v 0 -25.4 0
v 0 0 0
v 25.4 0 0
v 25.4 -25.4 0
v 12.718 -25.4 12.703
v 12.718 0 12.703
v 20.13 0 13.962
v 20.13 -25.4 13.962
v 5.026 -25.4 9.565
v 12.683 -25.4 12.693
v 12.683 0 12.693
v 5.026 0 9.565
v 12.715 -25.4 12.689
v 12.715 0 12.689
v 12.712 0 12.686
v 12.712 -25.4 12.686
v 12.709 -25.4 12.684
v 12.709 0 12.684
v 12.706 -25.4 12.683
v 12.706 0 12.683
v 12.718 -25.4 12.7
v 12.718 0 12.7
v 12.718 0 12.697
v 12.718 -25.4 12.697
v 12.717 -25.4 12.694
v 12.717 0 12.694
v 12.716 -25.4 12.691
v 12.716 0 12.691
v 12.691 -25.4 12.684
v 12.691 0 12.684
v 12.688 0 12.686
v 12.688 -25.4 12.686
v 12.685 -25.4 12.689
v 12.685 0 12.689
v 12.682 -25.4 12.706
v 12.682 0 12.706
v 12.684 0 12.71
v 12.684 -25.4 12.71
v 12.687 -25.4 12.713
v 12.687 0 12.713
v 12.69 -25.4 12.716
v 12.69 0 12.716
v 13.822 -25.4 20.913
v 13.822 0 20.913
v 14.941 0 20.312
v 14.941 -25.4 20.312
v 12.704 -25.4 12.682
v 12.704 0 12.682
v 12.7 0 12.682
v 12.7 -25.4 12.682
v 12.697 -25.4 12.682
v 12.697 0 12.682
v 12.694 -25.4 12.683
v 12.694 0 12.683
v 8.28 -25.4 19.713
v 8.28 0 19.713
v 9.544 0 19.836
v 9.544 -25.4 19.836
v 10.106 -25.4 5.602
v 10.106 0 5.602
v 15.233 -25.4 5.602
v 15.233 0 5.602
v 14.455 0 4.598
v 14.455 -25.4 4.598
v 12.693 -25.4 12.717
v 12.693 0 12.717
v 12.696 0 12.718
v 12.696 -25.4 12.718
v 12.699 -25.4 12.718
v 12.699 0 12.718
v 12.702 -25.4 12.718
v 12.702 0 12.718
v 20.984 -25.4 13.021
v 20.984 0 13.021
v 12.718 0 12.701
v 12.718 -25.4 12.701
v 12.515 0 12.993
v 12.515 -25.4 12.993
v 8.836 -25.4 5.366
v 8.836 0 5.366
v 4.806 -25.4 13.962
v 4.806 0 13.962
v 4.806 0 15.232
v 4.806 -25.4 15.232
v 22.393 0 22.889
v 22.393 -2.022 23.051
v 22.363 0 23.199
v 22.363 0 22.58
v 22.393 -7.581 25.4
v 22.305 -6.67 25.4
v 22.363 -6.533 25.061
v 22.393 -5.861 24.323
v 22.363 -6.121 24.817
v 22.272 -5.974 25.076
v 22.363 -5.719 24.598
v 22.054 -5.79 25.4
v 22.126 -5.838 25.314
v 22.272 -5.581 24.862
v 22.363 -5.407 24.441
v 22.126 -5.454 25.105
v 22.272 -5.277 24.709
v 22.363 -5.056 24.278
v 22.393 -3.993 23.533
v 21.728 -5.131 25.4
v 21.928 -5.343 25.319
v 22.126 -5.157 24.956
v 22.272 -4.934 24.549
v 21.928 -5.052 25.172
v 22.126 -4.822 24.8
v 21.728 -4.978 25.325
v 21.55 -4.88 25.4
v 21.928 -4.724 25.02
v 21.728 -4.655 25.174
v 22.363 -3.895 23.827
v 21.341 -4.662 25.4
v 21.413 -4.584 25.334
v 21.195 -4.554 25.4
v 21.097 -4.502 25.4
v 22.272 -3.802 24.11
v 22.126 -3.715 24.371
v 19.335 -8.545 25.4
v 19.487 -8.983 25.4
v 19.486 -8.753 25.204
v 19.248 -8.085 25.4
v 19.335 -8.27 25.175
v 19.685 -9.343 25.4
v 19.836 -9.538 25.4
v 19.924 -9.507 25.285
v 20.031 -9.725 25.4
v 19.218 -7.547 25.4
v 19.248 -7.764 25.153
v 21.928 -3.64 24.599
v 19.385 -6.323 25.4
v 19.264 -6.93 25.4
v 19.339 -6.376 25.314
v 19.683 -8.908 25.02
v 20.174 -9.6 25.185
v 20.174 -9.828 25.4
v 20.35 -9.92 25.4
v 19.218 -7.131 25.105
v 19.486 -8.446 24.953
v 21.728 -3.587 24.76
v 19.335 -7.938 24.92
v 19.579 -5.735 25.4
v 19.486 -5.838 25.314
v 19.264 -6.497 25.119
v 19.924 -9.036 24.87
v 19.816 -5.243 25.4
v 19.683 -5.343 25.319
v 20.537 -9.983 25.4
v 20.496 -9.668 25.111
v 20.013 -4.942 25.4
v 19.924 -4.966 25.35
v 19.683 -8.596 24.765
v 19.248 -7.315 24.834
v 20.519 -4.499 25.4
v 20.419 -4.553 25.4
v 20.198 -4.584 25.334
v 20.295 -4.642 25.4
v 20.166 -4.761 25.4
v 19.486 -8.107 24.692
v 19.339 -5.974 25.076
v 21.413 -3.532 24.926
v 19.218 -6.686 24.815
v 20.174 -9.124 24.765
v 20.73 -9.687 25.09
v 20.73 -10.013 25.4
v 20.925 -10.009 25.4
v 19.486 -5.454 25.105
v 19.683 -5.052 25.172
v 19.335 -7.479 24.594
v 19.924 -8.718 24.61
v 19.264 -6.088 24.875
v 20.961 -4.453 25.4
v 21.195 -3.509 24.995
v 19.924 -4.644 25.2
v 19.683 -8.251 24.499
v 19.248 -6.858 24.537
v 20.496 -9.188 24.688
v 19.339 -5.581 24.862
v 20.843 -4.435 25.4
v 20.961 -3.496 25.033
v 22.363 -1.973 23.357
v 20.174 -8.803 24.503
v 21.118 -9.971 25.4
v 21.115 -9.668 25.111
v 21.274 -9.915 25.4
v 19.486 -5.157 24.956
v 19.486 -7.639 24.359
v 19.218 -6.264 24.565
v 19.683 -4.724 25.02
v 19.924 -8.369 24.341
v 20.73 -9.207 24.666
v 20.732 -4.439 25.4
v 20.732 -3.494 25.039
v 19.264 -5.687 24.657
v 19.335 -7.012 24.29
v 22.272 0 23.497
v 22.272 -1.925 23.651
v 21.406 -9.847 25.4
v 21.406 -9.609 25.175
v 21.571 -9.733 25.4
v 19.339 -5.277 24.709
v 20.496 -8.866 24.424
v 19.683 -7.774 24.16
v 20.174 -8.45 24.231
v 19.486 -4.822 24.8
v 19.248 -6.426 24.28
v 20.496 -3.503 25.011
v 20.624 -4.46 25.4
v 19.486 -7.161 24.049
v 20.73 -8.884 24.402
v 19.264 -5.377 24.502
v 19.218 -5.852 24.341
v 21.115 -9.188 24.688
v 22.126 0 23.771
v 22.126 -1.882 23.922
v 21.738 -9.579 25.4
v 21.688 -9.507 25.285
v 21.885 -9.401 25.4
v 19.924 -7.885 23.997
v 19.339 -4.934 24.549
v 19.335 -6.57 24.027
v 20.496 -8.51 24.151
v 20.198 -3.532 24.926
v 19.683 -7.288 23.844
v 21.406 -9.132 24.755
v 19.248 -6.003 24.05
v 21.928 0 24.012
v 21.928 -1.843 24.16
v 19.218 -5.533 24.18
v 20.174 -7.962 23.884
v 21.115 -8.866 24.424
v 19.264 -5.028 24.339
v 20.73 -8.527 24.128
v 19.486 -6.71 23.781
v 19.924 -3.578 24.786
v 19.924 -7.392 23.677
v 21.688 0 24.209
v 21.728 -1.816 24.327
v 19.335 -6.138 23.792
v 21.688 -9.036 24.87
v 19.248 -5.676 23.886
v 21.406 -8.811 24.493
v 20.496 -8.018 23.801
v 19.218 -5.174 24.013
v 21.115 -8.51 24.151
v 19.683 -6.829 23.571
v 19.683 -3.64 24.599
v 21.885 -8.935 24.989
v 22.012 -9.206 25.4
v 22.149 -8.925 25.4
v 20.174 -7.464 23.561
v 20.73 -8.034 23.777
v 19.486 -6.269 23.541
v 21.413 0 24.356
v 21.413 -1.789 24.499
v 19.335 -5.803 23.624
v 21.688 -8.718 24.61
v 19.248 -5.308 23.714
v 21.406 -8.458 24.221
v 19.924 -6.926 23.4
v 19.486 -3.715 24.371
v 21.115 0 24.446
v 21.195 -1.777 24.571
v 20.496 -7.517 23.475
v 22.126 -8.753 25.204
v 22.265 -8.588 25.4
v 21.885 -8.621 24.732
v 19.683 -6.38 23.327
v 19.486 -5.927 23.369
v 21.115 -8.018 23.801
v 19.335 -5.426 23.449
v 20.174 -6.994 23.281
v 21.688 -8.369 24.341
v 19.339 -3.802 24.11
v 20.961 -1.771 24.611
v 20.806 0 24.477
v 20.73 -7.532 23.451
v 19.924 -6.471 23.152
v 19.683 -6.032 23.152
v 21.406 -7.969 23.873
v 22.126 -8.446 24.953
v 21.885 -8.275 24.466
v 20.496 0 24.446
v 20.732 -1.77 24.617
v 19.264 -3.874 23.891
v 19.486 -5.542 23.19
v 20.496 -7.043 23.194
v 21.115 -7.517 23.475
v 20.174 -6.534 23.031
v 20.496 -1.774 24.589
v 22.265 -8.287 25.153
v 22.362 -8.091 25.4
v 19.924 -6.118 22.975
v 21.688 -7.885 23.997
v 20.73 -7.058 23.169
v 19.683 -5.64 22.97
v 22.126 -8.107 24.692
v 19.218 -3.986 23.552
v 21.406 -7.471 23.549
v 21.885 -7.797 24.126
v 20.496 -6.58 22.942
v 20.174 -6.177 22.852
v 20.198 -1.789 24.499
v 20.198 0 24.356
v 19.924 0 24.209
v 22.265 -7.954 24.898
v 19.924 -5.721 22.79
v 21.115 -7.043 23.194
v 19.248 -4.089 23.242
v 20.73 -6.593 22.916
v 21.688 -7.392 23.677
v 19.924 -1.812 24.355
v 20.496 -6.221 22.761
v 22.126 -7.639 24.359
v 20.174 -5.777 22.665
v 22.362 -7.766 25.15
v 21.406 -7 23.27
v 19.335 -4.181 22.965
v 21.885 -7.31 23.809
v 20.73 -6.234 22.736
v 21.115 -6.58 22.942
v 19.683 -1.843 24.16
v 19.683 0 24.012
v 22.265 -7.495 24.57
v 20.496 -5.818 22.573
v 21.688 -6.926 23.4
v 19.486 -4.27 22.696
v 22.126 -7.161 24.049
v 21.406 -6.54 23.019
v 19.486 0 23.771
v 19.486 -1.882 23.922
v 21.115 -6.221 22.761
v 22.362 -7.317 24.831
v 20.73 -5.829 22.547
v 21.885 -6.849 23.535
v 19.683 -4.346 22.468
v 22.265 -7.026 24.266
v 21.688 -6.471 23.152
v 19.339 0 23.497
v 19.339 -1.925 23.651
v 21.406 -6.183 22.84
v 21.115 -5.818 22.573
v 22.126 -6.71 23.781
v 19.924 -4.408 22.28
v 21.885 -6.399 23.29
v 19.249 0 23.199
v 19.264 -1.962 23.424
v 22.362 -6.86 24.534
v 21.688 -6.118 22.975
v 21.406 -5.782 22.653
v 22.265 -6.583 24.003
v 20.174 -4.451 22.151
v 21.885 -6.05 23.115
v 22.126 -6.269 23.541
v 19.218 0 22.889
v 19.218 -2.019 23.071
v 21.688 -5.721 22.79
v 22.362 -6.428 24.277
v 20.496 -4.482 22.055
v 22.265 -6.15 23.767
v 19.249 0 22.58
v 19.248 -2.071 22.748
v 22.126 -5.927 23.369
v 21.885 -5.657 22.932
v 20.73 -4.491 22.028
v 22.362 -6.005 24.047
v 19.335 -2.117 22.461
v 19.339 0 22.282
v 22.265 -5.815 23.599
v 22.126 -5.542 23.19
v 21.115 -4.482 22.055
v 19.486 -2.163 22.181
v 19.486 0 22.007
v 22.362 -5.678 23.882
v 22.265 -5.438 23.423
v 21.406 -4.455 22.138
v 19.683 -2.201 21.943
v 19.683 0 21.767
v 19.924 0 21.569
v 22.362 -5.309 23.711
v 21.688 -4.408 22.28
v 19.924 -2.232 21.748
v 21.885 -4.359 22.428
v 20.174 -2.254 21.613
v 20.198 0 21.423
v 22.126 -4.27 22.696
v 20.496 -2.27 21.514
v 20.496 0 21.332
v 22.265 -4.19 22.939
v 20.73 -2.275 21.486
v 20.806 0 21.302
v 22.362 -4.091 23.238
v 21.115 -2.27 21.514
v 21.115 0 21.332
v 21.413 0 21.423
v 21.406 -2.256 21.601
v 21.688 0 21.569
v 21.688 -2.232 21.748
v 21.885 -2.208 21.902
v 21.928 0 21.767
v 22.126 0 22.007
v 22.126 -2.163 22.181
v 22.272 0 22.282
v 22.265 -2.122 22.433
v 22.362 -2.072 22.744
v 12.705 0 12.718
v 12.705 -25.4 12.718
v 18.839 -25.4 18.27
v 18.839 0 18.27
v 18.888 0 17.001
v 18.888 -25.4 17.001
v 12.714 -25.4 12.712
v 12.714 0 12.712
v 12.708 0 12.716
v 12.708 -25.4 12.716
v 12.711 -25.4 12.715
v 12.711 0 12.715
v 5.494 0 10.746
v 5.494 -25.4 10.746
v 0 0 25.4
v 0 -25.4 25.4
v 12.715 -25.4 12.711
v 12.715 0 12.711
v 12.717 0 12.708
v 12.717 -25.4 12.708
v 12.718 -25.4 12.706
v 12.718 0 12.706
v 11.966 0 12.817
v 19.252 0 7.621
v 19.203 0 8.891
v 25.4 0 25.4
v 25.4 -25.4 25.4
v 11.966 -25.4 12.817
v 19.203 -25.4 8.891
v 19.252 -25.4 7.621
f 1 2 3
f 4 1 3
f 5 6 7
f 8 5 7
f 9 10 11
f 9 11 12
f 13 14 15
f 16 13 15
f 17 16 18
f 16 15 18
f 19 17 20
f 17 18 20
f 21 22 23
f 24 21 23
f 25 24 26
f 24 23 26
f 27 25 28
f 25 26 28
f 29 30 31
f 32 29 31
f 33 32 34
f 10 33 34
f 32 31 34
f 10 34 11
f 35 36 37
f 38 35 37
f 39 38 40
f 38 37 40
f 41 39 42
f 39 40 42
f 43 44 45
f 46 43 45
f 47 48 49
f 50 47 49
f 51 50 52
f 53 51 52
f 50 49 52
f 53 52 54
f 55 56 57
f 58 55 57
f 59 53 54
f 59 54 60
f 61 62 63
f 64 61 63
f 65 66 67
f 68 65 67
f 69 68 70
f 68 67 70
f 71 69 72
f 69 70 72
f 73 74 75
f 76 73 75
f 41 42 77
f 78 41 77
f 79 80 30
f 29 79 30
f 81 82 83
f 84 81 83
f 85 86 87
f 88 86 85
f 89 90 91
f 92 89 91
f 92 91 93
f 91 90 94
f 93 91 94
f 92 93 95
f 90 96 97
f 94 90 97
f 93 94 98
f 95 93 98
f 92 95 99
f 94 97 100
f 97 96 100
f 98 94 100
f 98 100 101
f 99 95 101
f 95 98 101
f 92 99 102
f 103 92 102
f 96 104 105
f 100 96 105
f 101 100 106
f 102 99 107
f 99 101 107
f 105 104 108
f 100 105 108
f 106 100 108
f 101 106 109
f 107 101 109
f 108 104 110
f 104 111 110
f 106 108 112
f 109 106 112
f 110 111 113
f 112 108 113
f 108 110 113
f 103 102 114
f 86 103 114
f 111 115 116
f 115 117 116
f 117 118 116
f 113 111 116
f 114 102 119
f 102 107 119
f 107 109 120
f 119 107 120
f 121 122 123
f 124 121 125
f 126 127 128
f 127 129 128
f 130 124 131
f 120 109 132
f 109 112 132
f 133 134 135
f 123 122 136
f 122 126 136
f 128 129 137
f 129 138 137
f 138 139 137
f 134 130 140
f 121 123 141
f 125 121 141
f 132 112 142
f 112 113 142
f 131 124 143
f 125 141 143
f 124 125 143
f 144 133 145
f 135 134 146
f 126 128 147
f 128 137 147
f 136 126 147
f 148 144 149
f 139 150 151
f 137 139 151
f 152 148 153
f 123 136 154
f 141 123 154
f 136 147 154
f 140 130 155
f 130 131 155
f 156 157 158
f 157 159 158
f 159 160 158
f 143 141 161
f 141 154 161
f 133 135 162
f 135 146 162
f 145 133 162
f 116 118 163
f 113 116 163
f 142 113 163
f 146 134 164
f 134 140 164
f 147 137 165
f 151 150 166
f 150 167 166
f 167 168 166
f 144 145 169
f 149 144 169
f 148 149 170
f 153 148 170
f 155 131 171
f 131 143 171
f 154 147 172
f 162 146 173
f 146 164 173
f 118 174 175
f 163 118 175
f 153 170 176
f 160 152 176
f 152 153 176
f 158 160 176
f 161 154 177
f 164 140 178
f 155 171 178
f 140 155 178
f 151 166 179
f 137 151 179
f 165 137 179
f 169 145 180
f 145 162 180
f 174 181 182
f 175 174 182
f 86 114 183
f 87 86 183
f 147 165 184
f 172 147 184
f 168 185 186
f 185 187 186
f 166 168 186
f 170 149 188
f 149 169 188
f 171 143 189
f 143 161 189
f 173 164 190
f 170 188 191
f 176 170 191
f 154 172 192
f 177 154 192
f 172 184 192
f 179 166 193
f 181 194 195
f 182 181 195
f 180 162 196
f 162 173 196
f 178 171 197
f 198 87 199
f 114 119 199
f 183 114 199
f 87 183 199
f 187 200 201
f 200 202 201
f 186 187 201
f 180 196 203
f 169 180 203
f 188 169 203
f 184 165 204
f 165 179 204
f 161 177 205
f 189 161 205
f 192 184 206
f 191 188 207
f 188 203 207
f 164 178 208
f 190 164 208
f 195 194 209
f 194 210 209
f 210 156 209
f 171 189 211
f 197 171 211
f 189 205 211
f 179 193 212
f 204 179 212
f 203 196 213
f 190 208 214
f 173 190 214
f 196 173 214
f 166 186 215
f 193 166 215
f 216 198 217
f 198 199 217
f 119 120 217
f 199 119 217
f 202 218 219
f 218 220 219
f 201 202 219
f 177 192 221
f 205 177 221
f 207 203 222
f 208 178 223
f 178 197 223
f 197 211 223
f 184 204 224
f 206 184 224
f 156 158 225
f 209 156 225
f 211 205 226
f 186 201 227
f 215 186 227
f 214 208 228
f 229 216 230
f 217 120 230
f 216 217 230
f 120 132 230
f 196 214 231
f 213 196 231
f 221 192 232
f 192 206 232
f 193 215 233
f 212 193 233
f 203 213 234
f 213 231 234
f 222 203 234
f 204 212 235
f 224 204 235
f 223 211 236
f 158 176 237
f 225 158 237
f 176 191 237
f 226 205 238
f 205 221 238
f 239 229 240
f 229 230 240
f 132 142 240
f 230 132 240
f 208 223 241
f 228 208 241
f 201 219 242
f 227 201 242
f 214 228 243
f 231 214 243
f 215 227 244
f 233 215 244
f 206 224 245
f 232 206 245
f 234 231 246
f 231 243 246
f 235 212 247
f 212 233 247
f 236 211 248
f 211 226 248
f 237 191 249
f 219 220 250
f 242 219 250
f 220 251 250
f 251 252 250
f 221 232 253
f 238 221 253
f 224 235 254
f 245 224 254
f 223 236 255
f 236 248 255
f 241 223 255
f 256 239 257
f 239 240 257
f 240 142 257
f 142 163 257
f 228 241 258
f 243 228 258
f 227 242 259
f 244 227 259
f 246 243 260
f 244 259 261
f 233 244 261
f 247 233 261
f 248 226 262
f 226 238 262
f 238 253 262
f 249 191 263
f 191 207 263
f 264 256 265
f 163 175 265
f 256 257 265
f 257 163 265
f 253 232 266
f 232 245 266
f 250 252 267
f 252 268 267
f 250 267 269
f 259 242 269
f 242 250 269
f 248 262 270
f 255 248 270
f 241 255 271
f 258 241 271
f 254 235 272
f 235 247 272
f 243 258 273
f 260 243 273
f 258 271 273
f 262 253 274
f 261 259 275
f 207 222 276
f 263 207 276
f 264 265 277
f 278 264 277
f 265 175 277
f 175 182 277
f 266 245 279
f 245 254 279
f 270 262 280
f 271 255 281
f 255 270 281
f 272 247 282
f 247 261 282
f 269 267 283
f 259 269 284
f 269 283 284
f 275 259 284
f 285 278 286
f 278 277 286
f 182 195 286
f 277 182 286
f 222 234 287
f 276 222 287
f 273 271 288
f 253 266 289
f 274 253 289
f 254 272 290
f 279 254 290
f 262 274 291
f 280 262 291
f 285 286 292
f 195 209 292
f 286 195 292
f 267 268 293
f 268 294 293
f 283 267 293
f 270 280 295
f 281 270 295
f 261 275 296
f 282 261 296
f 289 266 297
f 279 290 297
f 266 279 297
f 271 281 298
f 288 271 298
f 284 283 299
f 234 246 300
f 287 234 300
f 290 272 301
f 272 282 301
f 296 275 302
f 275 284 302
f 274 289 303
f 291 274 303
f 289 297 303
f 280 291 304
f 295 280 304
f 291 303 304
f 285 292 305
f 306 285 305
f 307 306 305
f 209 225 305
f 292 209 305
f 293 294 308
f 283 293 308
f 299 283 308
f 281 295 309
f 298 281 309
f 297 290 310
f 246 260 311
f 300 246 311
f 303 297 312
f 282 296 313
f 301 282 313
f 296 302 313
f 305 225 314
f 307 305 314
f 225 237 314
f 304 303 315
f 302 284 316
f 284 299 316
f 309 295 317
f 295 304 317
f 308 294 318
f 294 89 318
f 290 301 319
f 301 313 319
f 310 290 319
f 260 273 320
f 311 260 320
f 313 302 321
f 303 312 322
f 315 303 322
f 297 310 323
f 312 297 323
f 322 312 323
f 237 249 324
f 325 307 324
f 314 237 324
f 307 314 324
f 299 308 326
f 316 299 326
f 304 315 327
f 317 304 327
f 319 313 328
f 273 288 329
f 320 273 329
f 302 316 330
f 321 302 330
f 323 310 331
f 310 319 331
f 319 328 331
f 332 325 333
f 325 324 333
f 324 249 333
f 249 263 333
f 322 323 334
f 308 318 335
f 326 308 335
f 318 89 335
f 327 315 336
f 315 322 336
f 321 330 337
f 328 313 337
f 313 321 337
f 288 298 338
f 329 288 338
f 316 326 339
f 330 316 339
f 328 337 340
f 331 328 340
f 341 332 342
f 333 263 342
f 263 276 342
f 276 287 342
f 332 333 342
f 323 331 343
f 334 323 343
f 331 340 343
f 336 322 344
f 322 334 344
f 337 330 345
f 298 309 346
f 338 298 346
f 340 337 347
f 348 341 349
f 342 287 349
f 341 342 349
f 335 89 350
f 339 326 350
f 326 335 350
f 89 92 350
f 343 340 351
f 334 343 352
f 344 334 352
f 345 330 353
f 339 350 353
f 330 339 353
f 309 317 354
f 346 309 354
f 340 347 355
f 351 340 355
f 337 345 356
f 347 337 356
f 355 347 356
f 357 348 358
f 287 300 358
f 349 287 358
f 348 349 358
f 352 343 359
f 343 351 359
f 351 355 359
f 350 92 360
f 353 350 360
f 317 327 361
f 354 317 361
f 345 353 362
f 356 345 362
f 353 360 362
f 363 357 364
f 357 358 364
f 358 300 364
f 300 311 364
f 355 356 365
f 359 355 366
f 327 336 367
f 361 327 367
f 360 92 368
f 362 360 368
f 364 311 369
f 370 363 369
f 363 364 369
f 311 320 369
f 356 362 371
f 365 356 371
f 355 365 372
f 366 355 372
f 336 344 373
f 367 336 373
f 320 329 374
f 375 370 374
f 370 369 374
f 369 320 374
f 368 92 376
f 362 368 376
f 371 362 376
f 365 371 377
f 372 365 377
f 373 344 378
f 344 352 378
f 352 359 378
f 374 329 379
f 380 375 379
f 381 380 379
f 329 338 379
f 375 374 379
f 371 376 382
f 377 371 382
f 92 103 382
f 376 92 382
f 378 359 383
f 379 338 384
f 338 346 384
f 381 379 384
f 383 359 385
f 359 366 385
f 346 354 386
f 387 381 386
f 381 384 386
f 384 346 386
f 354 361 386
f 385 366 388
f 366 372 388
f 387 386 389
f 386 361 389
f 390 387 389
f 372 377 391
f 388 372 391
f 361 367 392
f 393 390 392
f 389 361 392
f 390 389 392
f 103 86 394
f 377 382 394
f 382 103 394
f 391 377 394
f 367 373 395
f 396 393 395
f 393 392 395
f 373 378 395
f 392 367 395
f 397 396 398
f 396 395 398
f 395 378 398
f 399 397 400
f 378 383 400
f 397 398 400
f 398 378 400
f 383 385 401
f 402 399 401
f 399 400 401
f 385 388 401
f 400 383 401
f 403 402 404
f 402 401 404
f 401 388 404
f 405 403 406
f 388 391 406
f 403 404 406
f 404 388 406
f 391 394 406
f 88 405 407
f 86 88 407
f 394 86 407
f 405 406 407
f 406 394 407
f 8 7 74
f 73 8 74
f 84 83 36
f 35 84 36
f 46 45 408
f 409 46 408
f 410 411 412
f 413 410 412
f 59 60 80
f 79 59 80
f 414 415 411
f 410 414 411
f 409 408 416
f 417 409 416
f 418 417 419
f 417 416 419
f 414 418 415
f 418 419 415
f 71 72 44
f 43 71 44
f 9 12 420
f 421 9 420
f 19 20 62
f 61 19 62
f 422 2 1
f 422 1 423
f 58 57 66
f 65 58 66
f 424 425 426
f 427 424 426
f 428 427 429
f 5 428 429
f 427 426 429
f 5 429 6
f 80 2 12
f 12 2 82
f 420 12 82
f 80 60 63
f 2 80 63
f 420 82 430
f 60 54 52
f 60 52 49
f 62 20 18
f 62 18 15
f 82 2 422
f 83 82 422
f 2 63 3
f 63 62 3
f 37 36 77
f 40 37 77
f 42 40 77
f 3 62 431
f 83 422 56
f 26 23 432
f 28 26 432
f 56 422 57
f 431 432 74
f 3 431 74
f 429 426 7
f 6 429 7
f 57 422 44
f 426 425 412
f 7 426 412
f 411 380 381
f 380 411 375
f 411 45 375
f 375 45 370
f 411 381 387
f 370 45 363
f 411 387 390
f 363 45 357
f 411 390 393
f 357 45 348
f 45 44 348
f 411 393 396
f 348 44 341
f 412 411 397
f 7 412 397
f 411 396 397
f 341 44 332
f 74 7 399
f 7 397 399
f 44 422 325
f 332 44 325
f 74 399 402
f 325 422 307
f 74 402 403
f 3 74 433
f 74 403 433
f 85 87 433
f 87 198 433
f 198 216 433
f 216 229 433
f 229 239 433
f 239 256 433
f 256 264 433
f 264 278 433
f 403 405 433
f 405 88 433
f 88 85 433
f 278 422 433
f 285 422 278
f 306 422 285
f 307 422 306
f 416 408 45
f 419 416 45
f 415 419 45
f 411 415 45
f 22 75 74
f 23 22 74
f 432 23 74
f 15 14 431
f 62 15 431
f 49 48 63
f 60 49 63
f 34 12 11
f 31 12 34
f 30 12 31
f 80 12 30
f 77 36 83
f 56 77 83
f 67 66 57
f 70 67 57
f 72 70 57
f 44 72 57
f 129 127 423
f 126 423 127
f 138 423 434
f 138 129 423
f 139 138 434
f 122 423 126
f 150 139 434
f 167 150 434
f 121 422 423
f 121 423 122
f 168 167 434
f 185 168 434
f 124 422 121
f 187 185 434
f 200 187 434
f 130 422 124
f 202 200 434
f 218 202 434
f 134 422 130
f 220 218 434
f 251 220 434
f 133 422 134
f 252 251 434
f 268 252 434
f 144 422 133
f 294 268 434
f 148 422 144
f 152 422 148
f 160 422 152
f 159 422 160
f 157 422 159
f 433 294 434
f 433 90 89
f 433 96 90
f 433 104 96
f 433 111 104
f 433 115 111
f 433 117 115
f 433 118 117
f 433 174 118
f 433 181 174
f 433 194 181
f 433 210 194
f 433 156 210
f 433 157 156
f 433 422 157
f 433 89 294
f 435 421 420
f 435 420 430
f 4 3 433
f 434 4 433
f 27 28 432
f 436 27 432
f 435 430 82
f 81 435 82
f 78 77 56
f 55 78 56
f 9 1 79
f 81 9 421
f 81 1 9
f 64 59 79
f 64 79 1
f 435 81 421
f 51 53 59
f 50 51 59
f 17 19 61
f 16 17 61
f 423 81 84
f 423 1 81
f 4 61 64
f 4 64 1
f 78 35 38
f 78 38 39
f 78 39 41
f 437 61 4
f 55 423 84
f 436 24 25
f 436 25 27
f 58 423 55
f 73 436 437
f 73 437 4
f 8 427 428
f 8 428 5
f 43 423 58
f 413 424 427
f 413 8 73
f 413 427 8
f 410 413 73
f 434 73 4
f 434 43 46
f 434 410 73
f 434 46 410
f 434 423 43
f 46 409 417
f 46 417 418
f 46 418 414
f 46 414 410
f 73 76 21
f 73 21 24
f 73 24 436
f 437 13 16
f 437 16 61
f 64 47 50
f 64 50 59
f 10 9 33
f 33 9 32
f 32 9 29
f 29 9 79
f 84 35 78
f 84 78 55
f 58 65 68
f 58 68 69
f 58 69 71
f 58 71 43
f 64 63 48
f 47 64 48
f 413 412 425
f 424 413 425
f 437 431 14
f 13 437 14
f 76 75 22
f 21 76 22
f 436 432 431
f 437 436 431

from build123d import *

# Parameters (mm, degrees)
F0_W     = 25.4
F0_H     = 25.4
F1_DEPTH = 25.4
F2_R     = 1.5875


with BuildPart() as f1:
    # F0 (on Front) → F1 (new body)
    with BuildSketch(Plane.XZ):
        with Locations((12.7, 12.7)):
            Rectangle(F0_W, F0_H)
        with BuildLine():
            ThreePointArc((12.705212, 12.717705), (12.709806, 12.715636), (12.713669, 12.712402))
            Line((12.713669, 12.712402), (18.839256, 18.270461))
            Line((18.839256, 18.270461), (18.888431, 17.001414))
            Line((18.888431, 17.001414), (12.715155, 12.710534))
            ThreePointArc((12.715155, 12.710534), (12.717086, 12.706979), (12.718196, 12.703089))
            Line((12.718196, 12.703089), (20.130168, 13.961521))
            Line((20.130168, 13.961521), (20.983567, 13.020983))
            Line((20.983567, 13.020983), (12.718443, 12.700715))
            ThreePointArc((12.718443, 12.700715), (12.718453, 12.700357), (12.718457, 12.7))
            ThreePointArc((12.718457, 12.7), (12.717813, 12.695167), (12.715926, 12.690672))
            Line((12.715926, 12.690672), (19.202692, 8.891313))
            Line((19.202692, 8.891313), (19.251904, 7.621313))
            Line((19.251904, 7.621313), (12.714587, 12.688693))
            ThreePointArc((12.714587, 12.688693), (12.71083, 12.685055), (12.706202, 12.682617))
            Line((12.706202, 12.682617), (15.232591, 5.601773))
            Line((15.232591, 5.601773), (14.454533, 4.598018))
            Line((14.454533, 4.598018), (12.703906, 12.681962))
            ThreePointArc((12.703906, 12.681962), (12.698736, 12.681587), (12.693665, 12.682665))
            Line((12.693665, 12.682665), (10.106196, 5.601773))
            Line((10.106196, 5.601773), (8.836196, 5.365729))
            Line((8.836196, 5.365729), (12.691398, 12.683671))
            ThreePointArc((12.691398, 12.683671), (12.686331, 12.687598), (12.682914, 12.693021))
            Line((12.682914, 12.693021), (5.025776, 9.565228))
            Line((5.025776, 9.565228), (5.493536, 10.745948))
            Line((5.493536, 10.745948), (11.965962, 12.817308))
            Line((11.965962, 12.817308), (4.806211, 13.961521))
            Line((4.806211, 13.961521), (4.806211, 15.231521))
            Line((4.806211, 15.231521), (12.682425, 12.705636))
            ThreePointArc((12.682425, 12.705636), (12.685413, 12.711307), (12.69016, 12.715615))
            Line((12.69016, 12.715615), (12.515285, 12.993107))
            Line((12.515285, 12.993107), (8.280237, 19.713287))
            Line((8.280237, 19.713287), (9.544288, 19.836069))
            Line((9.544288, 19.836069), (12.692535, 12.71688))
            ThreePointArc((12.692535, 12.71688), (12.697419, 12.718275), (12.702499, 12.718287))
            Line((12.702499, 12.718287), (13.82232, 20.913459))
            Line((13.82232, 20.913459), (14.940951, 20.312158))
            Line((14.940951, 20.312158), (12.705212, 12.717705))
        make_face(mode=Mode.SUBTRACT)
    extrude(amount=F1_DEPTH)

    # F2 (on Front) → F3 (revolve, cut)
    with BuildSketch(Plane.XZ):
        with Locations((20.805778, 22.889411)):
            Circle(F2_R)
    revolve(axis=Axis((14.381558, 0, 35.589411), (1, 0, 0)), mode=Mode.SUBTRACT)


solid = f1.part
